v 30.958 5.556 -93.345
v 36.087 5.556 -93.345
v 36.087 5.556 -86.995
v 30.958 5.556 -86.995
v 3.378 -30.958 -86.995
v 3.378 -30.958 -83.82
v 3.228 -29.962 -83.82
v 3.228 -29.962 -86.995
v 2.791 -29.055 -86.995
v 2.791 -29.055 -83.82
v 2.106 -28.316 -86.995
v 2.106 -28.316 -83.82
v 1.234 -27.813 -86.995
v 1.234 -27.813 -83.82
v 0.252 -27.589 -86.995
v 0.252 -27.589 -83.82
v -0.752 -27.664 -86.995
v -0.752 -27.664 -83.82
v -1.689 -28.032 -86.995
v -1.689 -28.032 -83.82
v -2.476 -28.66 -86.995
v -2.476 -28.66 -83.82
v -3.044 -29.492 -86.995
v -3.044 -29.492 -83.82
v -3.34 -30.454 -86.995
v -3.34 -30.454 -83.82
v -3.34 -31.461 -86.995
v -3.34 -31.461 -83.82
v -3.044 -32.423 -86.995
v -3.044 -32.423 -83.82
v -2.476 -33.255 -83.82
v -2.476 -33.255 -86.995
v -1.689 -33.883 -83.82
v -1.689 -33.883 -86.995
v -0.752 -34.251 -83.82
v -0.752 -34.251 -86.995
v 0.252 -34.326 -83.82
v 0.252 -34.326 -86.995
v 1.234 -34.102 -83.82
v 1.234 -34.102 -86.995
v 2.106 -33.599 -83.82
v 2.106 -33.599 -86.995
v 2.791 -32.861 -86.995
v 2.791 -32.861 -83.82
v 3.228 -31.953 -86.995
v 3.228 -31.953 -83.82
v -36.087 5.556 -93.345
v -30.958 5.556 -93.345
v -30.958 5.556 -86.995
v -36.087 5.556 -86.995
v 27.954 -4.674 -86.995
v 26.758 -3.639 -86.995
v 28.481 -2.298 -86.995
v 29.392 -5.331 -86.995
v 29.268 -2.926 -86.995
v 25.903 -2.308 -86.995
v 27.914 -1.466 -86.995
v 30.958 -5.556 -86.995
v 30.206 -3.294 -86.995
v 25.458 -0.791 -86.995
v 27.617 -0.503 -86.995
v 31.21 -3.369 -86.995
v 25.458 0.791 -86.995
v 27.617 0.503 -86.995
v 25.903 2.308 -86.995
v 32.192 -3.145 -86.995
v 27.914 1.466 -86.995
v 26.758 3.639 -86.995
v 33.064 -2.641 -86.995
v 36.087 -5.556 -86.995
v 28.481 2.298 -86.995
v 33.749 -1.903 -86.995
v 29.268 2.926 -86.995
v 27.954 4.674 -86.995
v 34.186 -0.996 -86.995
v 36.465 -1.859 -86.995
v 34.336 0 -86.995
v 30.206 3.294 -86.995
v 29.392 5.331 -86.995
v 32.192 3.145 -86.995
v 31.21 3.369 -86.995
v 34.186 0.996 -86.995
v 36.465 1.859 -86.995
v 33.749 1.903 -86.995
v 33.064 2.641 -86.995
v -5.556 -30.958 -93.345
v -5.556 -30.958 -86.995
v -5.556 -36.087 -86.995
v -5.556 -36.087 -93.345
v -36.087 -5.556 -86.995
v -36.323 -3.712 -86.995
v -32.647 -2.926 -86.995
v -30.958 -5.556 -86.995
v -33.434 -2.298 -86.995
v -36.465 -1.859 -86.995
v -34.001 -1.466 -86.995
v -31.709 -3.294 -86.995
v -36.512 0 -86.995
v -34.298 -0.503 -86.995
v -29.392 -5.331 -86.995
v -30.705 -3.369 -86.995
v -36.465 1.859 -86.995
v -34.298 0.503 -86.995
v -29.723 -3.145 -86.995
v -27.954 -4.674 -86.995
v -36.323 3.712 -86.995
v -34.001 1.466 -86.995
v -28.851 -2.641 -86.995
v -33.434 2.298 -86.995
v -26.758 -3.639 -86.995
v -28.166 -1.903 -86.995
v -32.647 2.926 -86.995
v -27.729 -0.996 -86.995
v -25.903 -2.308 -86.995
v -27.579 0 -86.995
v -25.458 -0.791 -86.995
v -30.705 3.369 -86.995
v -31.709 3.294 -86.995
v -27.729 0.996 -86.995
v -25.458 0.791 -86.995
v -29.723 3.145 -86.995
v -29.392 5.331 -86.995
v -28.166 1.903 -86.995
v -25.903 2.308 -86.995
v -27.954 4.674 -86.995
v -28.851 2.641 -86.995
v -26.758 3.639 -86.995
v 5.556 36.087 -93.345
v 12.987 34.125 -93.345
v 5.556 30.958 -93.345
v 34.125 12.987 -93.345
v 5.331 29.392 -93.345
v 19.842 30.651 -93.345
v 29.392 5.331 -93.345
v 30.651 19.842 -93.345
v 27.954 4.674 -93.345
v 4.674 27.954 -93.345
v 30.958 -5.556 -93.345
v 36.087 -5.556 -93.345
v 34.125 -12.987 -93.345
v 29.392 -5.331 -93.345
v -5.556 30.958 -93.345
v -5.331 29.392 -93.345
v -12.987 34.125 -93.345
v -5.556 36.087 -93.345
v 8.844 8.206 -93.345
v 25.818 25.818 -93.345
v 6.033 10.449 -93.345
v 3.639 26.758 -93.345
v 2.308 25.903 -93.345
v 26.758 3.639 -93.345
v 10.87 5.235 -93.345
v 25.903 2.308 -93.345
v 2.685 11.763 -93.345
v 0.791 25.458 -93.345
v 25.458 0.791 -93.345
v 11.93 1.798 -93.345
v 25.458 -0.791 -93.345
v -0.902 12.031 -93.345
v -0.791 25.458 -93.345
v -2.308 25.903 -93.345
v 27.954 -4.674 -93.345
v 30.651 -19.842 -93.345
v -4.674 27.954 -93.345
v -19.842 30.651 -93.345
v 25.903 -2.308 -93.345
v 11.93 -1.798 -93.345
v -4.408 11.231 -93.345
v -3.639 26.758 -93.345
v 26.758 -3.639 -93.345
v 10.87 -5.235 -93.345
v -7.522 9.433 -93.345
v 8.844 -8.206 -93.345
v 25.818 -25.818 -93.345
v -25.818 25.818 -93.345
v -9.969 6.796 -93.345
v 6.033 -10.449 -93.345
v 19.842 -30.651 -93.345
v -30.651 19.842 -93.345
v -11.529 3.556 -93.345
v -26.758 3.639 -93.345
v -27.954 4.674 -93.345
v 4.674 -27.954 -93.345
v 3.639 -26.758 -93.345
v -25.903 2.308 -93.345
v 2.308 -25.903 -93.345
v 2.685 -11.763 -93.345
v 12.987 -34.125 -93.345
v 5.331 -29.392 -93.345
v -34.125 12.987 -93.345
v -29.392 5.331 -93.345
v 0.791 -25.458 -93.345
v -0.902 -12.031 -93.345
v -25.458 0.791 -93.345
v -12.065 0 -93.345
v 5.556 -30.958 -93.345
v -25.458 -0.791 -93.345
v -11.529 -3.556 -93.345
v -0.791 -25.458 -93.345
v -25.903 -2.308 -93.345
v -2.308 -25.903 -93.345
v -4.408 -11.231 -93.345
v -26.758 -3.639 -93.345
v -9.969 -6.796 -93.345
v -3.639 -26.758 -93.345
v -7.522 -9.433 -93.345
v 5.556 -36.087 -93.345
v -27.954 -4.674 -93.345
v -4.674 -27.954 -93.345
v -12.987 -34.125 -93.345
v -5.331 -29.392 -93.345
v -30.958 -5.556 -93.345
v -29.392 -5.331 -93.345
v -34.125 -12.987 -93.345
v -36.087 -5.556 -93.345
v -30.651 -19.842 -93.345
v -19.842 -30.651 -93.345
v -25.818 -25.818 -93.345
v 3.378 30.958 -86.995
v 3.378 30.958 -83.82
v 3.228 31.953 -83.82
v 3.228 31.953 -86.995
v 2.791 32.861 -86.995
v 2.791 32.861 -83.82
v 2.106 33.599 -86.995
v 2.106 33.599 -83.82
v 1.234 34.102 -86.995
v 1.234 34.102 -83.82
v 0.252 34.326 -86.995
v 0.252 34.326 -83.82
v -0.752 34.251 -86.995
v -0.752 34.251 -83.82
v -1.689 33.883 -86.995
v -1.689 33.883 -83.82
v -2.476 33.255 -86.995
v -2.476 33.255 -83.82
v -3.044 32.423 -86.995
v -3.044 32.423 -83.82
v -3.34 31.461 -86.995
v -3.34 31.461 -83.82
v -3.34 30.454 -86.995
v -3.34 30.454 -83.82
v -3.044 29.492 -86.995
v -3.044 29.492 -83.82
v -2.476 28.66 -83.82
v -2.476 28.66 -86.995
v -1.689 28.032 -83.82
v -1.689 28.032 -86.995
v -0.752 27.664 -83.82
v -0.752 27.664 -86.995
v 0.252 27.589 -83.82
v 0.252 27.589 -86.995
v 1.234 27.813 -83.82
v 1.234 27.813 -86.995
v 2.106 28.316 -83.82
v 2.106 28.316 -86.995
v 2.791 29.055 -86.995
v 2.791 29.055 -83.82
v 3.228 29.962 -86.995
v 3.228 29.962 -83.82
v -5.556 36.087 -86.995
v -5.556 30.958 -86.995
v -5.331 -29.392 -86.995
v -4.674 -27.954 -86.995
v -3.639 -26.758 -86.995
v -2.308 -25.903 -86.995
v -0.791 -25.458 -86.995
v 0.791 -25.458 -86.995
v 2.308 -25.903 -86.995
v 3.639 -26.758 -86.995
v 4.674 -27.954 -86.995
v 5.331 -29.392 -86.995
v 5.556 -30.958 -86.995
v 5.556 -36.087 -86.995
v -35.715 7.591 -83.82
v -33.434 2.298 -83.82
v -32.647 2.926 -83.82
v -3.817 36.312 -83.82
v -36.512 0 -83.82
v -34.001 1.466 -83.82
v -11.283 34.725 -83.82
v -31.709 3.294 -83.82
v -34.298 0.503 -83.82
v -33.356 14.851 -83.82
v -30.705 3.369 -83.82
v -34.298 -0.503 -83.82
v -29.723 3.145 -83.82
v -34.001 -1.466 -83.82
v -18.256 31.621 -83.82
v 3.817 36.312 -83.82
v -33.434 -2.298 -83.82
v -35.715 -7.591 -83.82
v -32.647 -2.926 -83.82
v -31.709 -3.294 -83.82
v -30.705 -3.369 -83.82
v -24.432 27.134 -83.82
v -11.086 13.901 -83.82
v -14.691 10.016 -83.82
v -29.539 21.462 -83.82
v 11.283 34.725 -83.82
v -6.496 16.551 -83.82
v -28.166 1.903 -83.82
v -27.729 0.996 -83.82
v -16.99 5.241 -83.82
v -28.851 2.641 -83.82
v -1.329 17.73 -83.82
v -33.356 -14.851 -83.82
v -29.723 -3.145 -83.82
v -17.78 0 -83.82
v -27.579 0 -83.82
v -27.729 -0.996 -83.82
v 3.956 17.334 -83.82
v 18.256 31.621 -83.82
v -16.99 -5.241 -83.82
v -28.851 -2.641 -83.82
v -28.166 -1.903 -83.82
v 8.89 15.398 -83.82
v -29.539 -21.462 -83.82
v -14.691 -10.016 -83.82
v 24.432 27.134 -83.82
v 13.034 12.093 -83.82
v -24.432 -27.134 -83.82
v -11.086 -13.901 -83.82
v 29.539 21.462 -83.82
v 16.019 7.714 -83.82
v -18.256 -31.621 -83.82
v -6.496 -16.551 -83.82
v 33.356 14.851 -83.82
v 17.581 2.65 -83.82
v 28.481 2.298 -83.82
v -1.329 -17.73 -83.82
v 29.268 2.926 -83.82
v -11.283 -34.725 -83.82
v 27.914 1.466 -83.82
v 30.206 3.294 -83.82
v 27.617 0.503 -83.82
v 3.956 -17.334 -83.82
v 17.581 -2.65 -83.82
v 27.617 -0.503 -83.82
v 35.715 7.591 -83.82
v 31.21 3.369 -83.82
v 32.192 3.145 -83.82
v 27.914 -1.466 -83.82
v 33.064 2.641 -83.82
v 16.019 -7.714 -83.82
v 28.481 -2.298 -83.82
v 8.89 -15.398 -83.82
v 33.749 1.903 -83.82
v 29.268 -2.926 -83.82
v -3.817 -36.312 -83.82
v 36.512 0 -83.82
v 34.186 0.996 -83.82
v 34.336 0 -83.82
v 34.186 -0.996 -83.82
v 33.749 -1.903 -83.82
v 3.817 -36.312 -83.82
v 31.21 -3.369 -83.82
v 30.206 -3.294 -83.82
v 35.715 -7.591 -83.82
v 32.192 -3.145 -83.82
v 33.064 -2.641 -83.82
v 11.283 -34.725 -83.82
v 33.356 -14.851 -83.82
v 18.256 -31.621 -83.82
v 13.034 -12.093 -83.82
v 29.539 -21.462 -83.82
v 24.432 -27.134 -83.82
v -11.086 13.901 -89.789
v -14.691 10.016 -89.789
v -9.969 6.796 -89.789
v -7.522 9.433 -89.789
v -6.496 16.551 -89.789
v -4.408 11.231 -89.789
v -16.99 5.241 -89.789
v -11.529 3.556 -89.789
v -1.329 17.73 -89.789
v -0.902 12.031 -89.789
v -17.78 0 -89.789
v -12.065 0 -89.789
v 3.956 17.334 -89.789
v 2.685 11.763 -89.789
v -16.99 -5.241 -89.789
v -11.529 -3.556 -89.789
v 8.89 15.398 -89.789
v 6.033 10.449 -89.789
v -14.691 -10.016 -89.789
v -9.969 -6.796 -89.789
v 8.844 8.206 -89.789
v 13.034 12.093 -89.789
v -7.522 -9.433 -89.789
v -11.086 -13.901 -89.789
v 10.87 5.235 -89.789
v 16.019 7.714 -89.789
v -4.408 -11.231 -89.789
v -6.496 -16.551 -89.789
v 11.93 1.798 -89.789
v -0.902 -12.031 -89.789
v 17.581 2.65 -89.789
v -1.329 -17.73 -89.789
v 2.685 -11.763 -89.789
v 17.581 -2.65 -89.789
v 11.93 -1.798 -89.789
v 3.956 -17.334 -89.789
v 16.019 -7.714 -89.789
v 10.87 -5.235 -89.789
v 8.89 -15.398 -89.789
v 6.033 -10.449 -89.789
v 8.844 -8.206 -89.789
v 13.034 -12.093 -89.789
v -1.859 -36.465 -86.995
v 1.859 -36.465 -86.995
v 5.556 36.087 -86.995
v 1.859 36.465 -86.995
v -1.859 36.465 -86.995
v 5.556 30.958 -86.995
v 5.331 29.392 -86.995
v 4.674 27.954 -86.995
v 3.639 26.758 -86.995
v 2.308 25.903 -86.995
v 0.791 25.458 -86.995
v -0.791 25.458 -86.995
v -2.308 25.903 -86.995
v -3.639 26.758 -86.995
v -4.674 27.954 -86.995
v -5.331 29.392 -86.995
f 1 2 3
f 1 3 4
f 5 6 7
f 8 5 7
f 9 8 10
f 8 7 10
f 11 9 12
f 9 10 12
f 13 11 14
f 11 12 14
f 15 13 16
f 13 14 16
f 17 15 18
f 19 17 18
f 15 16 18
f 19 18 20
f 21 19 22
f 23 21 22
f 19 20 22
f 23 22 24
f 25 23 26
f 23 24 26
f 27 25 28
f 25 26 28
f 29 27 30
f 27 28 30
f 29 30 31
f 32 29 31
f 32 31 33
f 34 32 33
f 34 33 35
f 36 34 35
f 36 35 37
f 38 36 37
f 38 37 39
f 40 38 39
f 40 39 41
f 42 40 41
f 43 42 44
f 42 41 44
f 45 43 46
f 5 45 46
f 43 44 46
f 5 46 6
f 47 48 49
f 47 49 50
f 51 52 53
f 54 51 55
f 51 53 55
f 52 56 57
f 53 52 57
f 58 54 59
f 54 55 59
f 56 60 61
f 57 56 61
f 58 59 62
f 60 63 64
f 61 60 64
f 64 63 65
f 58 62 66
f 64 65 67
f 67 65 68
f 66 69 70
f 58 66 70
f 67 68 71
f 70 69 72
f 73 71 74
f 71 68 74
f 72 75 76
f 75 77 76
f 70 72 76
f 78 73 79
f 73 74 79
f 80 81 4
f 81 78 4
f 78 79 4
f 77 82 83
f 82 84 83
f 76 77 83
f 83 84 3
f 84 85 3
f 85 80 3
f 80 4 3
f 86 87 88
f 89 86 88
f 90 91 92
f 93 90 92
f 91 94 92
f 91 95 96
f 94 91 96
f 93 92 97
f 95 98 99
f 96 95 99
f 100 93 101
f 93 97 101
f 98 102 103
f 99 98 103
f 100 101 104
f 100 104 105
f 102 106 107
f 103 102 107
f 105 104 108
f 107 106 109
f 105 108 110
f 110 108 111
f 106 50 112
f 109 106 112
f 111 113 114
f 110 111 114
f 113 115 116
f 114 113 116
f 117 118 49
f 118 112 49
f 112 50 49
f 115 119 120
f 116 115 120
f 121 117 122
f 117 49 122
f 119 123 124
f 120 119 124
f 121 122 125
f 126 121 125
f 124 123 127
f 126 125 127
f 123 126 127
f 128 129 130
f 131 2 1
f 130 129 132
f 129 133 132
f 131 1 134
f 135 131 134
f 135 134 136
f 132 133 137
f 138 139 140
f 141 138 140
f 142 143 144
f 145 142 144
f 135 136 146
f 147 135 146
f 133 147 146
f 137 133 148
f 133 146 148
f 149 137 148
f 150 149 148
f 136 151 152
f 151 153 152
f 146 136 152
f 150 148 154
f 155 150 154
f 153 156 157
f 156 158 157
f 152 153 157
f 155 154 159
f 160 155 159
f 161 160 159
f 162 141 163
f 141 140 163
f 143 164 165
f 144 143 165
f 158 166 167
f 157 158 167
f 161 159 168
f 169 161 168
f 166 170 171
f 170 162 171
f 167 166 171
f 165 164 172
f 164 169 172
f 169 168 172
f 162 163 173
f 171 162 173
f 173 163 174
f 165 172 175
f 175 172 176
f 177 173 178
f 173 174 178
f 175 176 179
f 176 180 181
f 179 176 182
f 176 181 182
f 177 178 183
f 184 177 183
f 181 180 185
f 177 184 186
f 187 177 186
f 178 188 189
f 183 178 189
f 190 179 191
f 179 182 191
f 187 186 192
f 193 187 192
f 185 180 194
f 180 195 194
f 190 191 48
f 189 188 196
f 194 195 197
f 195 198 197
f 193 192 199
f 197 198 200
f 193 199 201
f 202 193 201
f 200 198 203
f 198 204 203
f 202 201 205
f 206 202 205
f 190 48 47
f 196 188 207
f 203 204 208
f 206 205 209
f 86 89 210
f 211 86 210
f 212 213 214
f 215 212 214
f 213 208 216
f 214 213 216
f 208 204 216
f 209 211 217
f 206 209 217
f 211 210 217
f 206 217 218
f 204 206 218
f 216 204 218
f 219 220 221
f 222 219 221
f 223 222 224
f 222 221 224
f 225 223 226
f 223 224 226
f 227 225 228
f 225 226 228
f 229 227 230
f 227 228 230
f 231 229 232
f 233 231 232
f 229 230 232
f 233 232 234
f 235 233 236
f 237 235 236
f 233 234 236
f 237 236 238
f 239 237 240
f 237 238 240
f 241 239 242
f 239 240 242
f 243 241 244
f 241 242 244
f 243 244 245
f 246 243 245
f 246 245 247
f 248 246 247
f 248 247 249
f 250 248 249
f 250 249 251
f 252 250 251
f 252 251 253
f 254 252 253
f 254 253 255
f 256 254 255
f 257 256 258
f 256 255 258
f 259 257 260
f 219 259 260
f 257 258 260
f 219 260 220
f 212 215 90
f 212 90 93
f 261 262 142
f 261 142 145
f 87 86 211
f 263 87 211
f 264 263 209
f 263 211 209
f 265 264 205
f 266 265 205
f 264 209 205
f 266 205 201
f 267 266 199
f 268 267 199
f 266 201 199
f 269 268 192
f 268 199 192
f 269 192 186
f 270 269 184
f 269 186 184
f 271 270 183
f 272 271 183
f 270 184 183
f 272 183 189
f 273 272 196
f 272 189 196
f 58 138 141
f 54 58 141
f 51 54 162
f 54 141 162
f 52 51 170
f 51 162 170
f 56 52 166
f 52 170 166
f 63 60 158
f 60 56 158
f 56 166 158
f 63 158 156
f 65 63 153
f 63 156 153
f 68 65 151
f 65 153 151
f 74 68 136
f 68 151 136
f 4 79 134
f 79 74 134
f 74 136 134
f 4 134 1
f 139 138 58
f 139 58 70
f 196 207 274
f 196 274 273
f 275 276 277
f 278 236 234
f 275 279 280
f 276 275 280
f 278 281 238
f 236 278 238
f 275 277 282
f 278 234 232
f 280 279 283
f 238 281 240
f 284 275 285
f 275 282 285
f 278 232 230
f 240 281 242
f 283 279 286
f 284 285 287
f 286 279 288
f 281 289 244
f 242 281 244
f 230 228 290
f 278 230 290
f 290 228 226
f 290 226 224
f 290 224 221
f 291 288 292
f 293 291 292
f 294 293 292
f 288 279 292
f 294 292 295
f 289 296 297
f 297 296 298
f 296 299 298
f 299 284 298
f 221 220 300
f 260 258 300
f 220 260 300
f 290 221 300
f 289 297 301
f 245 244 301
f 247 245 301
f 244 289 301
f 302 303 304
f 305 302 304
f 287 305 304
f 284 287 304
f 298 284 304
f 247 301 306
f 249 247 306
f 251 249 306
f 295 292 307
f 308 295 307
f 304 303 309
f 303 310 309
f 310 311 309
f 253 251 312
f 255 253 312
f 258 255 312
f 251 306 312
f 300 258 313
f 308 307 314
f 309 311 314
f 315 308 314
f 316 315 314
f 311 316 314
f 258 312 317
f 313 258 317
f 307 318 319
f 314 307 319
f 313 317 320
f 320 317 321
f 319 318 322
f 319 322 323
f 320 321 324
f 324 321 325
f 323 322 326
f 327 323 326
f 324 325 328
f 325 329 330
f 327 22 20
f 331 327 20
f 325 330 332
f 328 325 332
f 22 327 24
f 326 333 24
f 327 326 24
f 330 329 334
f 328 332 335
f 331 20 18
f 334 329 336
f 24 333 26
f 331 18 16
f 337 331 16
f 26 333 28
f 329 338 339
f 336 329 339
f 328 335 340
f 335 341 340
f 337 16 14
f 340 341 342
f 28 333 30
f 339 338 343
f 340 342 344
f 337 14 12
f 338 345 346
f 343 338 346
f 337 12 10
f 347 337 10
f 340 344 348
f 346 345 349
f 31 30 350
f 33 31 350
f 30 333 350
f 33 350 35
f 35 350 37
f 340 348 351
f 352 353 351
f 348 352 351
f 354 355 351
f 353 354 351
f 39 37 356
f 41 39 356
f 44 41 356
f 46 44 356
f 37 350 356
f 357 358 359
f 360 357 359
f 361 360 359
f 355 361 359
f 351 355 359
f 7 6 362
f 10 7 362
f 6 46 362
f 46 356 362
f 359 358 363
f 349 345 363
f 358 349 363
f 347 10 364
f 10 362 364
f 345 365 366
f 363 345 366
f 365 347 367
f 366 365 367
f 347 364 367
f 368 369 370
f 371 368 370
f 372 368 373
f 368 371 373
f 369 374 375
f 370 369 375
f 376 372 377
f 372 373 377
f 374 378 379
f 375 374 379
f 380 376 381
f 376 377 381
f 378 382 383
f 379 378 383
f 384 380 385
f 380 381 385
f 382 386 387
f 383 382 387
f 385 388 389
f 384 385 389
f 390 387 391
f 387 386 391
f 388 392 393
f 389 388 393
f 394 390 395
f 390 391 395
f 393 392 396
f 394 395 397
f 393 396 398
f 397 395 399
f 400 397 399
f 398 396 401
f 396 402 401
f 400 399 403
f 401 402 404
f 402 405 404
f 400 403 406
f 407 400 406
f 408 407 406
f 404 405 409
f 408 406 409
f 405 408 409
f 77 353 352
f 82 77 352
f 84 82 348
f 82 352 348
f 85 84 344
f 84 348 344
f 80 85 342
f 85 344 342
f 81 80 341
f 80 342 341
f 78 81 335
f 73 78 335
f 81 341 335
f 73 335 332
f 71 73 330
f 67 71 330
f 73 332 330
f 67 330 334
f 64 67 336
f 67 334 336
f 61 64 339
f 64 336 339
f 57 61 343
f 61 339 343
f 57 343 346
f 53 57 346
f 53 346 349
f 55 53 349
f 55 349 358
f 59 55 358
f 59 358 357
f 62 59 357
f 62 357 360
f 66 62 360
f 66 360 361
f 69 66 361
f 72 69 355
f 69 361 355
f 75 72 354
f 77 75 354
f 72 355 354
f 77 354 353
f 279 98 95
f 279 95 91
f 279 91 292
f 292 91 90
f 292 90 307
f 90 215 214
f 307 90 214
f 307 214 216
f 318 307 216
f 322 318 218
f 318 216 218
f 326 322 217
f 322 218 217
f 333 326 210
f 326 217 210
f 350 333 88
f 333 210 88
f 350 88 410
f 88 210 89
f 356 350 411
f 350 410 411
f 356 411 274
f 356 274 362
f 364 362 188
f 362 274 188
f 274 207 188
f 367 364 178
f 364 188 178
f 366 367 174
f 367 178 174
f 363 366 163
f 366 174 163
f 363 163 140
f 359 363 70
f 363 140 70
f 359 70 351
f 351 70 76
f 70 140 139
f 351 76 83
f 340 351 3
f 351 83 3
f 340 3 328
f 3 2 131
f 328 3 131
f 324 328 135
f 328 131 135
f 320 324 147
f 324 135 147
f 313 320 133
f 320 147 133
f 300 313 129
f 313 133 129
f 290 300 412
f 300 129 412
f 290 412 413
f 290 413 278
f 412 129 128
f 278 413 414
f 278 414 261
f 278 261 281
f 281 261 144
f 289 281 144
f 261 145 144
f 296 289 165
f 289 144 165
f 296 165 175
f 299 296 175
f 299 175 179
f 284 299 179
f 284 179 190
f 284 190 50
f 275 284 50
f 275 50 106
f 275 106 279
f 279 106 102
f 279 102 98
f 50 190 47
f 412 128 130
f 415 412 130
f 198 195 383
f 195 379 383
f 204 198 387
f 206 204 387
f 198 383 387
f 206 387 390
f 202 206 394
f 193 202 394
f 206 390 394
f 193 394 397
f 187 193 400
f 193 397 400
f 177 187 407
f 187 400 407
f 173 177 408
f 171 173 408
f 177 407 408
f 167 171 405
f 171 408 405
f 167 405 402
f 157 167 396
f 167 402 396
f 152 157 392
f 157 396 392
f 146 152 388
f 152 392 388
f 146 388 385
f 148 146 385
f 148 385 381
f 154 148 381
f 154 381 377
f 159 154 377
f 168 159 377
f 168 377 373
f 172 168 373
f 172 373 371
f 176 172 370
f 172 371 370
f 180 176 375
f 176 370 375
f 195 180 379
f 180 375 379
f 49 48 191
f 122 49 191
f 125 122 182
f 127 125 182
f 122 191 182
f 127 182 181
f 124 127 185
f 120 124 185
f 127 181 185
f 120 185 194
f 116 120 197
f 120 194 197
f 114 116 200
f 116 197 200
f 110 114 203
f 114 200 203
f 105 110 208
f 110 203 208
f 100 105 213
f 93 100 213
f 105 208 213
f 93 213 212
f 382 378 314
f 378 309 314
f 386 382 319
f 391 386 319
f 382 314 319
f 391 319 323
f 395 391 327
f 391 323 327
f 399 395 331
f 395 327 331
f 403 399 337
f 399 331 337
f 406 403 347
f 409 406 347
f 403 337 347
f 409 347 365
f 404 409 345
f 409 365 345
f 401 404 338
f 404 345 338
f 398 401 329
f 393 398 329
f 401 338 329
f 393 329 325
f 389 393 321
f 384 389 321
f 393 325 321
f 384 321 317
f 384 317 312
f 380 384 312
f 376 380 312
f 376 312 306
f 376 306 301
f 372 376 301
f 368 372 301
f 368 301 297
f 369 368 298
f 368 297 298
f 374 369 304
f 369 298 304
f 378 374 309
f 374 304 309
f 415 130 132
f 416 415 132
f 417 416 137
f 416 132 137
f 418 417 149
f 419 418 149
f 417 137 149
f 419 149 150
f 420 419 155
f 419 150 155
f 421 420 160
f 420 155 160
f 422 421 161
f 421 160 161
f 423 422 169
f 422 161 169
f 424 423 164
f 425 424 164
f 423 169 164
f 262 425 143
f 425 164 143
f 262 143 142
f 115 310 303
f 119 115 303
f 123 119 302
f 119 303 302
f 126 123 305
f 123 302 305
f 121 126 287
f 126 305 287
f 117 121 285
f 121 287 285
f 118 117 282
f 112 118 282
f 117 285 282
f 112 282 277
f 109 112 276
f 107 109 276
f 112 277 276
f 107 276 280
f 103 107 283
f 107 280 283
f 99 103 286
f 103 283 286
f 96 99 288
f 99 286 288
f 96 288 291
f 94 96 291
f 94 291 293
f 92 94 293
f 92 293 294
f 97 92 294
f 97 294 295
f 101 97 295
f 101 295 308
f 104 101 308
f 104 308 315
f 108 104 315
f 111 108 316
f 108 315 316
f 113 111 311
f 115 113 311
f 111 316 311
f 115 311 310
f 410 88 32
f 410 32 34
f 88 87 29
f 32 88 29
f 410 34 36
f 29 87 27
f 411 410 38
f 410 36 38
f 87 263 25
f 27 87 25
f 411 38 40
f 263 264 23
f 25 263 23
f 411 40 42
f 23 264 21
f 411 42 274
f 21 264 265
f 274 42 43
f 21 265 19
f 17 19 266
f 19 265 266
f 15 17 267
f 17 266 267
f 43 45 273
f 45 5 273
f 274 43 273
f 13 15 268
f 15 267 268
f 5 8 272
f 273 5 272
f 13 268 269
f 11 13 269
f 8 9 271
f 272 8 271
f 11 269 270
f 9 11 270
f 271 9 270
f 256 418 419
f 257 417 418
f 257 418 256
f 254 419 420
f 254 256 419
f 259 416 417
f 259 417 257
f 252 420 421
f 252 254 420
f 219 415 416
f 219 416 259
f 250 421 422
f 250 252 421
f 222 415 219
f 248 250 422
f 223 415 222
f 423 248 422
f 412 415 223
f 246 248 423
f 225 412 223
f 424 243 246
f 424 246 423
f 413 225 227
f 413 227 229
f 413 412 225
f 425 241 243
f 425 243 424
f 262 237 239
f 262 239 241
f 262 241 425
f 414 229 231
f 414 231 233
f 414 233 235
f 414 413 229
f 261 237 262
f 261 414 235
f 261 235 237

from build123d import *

# Parameters (mm, degrees)
CBORE_FOR_1_4_SOCKET_HEAD_CAP_SCREW1_D           = 6.7564
CBORE_FOR_1_4_SOCKET_HEAD_CAP_SCREW1_CBORE_D     = 11.1125
CBORE_FOR_1_4_SOCKET_HEAD_CAP_SCREW1_CBORE_DEPTH = 6.35
CUT_EXTRUDE1_DEPTH                               = 6.35


with BuildPart() as part:
    # Cap → Endcap-Revolve (revolve)
    with BuildSketch(Plane(origin=(0, 0, 0), x_dir=(0, 0, -1), z_dir=(1, 0, 0)), mode=Mode.PRIVATE) as endcap_revolve_sk:
        Polygon((93.345, 12.065), (89.789, 12.065), (89.789, 17.78), (83.82, 17.78), (83.82, 36.5125), (93.345, 36.5125), align=None)
    revolve(endcap_revolve_sk.sketch.rotate(Axis((0, 0, -141.5522592), (0, 0, 1)), 90), axis=Axis((0, 0, -141.5522592), (0, 0, 1)))

    # CBORE for 1/4 Socket Head Cap Screw1 (through all)
    with Locations(Plane(origin=(0, 0, -93.345), x_dir=(-1, 0, 0), z_dir=(0, 0, -1))):
        with Locations((0, 30.95752), (30.95752, 0), (0, -30.95752), (-30.95752, 0)):
            CounterBoreHole(CBORE_FOR_1_4_SOCKET_HEAD_CAP_SCREW1_D / 2, CBORE_FOR_1_4_SOCKET_HEAD_CAP_SCREW1_CBORE_D / 2, CBORE_FOR_1_4_SOCKET_HEAD_CAP_SCREW1_CBORE_DEPTH)

    # Bolt-Clearance → Cut-Extrude1 (cut)
    with BuildSketch(Plane(origin=(0, 0, -93.345), x_dir=(-1, 0, 0), z_dir=(0, 0, -1))):
        Polygon((5.55625, 30.95752), (5.55625, 37.30752), (-5.55625, 37.30752), (-5.55625, 30.95752), (0, 30.95752), align=None)
        Polygon((30.95752, 0), (30.95752, 5.55625), (37.30752, 5.55625), (37.30752, -5.55625), (30.95752, -5.55625), align=None)
        Polygon((0, -30.95752), (5.55625, -30.95752), (5.55625, -37.30752), (-5.55625, -37.30752), (-5.55625, -30.95752), align=None)
        Polygon((-30.95752, 0), (-30.95752, -5.55625), (-37.30752, -5.55625), (-37.30752, 5.55625), (-30.95752, 5.55625), align=None)
    extrude(amount=-CUT_EXTRUDE1_DEPTH, mode=Mode.SUBTRACT)


solid = part.part
